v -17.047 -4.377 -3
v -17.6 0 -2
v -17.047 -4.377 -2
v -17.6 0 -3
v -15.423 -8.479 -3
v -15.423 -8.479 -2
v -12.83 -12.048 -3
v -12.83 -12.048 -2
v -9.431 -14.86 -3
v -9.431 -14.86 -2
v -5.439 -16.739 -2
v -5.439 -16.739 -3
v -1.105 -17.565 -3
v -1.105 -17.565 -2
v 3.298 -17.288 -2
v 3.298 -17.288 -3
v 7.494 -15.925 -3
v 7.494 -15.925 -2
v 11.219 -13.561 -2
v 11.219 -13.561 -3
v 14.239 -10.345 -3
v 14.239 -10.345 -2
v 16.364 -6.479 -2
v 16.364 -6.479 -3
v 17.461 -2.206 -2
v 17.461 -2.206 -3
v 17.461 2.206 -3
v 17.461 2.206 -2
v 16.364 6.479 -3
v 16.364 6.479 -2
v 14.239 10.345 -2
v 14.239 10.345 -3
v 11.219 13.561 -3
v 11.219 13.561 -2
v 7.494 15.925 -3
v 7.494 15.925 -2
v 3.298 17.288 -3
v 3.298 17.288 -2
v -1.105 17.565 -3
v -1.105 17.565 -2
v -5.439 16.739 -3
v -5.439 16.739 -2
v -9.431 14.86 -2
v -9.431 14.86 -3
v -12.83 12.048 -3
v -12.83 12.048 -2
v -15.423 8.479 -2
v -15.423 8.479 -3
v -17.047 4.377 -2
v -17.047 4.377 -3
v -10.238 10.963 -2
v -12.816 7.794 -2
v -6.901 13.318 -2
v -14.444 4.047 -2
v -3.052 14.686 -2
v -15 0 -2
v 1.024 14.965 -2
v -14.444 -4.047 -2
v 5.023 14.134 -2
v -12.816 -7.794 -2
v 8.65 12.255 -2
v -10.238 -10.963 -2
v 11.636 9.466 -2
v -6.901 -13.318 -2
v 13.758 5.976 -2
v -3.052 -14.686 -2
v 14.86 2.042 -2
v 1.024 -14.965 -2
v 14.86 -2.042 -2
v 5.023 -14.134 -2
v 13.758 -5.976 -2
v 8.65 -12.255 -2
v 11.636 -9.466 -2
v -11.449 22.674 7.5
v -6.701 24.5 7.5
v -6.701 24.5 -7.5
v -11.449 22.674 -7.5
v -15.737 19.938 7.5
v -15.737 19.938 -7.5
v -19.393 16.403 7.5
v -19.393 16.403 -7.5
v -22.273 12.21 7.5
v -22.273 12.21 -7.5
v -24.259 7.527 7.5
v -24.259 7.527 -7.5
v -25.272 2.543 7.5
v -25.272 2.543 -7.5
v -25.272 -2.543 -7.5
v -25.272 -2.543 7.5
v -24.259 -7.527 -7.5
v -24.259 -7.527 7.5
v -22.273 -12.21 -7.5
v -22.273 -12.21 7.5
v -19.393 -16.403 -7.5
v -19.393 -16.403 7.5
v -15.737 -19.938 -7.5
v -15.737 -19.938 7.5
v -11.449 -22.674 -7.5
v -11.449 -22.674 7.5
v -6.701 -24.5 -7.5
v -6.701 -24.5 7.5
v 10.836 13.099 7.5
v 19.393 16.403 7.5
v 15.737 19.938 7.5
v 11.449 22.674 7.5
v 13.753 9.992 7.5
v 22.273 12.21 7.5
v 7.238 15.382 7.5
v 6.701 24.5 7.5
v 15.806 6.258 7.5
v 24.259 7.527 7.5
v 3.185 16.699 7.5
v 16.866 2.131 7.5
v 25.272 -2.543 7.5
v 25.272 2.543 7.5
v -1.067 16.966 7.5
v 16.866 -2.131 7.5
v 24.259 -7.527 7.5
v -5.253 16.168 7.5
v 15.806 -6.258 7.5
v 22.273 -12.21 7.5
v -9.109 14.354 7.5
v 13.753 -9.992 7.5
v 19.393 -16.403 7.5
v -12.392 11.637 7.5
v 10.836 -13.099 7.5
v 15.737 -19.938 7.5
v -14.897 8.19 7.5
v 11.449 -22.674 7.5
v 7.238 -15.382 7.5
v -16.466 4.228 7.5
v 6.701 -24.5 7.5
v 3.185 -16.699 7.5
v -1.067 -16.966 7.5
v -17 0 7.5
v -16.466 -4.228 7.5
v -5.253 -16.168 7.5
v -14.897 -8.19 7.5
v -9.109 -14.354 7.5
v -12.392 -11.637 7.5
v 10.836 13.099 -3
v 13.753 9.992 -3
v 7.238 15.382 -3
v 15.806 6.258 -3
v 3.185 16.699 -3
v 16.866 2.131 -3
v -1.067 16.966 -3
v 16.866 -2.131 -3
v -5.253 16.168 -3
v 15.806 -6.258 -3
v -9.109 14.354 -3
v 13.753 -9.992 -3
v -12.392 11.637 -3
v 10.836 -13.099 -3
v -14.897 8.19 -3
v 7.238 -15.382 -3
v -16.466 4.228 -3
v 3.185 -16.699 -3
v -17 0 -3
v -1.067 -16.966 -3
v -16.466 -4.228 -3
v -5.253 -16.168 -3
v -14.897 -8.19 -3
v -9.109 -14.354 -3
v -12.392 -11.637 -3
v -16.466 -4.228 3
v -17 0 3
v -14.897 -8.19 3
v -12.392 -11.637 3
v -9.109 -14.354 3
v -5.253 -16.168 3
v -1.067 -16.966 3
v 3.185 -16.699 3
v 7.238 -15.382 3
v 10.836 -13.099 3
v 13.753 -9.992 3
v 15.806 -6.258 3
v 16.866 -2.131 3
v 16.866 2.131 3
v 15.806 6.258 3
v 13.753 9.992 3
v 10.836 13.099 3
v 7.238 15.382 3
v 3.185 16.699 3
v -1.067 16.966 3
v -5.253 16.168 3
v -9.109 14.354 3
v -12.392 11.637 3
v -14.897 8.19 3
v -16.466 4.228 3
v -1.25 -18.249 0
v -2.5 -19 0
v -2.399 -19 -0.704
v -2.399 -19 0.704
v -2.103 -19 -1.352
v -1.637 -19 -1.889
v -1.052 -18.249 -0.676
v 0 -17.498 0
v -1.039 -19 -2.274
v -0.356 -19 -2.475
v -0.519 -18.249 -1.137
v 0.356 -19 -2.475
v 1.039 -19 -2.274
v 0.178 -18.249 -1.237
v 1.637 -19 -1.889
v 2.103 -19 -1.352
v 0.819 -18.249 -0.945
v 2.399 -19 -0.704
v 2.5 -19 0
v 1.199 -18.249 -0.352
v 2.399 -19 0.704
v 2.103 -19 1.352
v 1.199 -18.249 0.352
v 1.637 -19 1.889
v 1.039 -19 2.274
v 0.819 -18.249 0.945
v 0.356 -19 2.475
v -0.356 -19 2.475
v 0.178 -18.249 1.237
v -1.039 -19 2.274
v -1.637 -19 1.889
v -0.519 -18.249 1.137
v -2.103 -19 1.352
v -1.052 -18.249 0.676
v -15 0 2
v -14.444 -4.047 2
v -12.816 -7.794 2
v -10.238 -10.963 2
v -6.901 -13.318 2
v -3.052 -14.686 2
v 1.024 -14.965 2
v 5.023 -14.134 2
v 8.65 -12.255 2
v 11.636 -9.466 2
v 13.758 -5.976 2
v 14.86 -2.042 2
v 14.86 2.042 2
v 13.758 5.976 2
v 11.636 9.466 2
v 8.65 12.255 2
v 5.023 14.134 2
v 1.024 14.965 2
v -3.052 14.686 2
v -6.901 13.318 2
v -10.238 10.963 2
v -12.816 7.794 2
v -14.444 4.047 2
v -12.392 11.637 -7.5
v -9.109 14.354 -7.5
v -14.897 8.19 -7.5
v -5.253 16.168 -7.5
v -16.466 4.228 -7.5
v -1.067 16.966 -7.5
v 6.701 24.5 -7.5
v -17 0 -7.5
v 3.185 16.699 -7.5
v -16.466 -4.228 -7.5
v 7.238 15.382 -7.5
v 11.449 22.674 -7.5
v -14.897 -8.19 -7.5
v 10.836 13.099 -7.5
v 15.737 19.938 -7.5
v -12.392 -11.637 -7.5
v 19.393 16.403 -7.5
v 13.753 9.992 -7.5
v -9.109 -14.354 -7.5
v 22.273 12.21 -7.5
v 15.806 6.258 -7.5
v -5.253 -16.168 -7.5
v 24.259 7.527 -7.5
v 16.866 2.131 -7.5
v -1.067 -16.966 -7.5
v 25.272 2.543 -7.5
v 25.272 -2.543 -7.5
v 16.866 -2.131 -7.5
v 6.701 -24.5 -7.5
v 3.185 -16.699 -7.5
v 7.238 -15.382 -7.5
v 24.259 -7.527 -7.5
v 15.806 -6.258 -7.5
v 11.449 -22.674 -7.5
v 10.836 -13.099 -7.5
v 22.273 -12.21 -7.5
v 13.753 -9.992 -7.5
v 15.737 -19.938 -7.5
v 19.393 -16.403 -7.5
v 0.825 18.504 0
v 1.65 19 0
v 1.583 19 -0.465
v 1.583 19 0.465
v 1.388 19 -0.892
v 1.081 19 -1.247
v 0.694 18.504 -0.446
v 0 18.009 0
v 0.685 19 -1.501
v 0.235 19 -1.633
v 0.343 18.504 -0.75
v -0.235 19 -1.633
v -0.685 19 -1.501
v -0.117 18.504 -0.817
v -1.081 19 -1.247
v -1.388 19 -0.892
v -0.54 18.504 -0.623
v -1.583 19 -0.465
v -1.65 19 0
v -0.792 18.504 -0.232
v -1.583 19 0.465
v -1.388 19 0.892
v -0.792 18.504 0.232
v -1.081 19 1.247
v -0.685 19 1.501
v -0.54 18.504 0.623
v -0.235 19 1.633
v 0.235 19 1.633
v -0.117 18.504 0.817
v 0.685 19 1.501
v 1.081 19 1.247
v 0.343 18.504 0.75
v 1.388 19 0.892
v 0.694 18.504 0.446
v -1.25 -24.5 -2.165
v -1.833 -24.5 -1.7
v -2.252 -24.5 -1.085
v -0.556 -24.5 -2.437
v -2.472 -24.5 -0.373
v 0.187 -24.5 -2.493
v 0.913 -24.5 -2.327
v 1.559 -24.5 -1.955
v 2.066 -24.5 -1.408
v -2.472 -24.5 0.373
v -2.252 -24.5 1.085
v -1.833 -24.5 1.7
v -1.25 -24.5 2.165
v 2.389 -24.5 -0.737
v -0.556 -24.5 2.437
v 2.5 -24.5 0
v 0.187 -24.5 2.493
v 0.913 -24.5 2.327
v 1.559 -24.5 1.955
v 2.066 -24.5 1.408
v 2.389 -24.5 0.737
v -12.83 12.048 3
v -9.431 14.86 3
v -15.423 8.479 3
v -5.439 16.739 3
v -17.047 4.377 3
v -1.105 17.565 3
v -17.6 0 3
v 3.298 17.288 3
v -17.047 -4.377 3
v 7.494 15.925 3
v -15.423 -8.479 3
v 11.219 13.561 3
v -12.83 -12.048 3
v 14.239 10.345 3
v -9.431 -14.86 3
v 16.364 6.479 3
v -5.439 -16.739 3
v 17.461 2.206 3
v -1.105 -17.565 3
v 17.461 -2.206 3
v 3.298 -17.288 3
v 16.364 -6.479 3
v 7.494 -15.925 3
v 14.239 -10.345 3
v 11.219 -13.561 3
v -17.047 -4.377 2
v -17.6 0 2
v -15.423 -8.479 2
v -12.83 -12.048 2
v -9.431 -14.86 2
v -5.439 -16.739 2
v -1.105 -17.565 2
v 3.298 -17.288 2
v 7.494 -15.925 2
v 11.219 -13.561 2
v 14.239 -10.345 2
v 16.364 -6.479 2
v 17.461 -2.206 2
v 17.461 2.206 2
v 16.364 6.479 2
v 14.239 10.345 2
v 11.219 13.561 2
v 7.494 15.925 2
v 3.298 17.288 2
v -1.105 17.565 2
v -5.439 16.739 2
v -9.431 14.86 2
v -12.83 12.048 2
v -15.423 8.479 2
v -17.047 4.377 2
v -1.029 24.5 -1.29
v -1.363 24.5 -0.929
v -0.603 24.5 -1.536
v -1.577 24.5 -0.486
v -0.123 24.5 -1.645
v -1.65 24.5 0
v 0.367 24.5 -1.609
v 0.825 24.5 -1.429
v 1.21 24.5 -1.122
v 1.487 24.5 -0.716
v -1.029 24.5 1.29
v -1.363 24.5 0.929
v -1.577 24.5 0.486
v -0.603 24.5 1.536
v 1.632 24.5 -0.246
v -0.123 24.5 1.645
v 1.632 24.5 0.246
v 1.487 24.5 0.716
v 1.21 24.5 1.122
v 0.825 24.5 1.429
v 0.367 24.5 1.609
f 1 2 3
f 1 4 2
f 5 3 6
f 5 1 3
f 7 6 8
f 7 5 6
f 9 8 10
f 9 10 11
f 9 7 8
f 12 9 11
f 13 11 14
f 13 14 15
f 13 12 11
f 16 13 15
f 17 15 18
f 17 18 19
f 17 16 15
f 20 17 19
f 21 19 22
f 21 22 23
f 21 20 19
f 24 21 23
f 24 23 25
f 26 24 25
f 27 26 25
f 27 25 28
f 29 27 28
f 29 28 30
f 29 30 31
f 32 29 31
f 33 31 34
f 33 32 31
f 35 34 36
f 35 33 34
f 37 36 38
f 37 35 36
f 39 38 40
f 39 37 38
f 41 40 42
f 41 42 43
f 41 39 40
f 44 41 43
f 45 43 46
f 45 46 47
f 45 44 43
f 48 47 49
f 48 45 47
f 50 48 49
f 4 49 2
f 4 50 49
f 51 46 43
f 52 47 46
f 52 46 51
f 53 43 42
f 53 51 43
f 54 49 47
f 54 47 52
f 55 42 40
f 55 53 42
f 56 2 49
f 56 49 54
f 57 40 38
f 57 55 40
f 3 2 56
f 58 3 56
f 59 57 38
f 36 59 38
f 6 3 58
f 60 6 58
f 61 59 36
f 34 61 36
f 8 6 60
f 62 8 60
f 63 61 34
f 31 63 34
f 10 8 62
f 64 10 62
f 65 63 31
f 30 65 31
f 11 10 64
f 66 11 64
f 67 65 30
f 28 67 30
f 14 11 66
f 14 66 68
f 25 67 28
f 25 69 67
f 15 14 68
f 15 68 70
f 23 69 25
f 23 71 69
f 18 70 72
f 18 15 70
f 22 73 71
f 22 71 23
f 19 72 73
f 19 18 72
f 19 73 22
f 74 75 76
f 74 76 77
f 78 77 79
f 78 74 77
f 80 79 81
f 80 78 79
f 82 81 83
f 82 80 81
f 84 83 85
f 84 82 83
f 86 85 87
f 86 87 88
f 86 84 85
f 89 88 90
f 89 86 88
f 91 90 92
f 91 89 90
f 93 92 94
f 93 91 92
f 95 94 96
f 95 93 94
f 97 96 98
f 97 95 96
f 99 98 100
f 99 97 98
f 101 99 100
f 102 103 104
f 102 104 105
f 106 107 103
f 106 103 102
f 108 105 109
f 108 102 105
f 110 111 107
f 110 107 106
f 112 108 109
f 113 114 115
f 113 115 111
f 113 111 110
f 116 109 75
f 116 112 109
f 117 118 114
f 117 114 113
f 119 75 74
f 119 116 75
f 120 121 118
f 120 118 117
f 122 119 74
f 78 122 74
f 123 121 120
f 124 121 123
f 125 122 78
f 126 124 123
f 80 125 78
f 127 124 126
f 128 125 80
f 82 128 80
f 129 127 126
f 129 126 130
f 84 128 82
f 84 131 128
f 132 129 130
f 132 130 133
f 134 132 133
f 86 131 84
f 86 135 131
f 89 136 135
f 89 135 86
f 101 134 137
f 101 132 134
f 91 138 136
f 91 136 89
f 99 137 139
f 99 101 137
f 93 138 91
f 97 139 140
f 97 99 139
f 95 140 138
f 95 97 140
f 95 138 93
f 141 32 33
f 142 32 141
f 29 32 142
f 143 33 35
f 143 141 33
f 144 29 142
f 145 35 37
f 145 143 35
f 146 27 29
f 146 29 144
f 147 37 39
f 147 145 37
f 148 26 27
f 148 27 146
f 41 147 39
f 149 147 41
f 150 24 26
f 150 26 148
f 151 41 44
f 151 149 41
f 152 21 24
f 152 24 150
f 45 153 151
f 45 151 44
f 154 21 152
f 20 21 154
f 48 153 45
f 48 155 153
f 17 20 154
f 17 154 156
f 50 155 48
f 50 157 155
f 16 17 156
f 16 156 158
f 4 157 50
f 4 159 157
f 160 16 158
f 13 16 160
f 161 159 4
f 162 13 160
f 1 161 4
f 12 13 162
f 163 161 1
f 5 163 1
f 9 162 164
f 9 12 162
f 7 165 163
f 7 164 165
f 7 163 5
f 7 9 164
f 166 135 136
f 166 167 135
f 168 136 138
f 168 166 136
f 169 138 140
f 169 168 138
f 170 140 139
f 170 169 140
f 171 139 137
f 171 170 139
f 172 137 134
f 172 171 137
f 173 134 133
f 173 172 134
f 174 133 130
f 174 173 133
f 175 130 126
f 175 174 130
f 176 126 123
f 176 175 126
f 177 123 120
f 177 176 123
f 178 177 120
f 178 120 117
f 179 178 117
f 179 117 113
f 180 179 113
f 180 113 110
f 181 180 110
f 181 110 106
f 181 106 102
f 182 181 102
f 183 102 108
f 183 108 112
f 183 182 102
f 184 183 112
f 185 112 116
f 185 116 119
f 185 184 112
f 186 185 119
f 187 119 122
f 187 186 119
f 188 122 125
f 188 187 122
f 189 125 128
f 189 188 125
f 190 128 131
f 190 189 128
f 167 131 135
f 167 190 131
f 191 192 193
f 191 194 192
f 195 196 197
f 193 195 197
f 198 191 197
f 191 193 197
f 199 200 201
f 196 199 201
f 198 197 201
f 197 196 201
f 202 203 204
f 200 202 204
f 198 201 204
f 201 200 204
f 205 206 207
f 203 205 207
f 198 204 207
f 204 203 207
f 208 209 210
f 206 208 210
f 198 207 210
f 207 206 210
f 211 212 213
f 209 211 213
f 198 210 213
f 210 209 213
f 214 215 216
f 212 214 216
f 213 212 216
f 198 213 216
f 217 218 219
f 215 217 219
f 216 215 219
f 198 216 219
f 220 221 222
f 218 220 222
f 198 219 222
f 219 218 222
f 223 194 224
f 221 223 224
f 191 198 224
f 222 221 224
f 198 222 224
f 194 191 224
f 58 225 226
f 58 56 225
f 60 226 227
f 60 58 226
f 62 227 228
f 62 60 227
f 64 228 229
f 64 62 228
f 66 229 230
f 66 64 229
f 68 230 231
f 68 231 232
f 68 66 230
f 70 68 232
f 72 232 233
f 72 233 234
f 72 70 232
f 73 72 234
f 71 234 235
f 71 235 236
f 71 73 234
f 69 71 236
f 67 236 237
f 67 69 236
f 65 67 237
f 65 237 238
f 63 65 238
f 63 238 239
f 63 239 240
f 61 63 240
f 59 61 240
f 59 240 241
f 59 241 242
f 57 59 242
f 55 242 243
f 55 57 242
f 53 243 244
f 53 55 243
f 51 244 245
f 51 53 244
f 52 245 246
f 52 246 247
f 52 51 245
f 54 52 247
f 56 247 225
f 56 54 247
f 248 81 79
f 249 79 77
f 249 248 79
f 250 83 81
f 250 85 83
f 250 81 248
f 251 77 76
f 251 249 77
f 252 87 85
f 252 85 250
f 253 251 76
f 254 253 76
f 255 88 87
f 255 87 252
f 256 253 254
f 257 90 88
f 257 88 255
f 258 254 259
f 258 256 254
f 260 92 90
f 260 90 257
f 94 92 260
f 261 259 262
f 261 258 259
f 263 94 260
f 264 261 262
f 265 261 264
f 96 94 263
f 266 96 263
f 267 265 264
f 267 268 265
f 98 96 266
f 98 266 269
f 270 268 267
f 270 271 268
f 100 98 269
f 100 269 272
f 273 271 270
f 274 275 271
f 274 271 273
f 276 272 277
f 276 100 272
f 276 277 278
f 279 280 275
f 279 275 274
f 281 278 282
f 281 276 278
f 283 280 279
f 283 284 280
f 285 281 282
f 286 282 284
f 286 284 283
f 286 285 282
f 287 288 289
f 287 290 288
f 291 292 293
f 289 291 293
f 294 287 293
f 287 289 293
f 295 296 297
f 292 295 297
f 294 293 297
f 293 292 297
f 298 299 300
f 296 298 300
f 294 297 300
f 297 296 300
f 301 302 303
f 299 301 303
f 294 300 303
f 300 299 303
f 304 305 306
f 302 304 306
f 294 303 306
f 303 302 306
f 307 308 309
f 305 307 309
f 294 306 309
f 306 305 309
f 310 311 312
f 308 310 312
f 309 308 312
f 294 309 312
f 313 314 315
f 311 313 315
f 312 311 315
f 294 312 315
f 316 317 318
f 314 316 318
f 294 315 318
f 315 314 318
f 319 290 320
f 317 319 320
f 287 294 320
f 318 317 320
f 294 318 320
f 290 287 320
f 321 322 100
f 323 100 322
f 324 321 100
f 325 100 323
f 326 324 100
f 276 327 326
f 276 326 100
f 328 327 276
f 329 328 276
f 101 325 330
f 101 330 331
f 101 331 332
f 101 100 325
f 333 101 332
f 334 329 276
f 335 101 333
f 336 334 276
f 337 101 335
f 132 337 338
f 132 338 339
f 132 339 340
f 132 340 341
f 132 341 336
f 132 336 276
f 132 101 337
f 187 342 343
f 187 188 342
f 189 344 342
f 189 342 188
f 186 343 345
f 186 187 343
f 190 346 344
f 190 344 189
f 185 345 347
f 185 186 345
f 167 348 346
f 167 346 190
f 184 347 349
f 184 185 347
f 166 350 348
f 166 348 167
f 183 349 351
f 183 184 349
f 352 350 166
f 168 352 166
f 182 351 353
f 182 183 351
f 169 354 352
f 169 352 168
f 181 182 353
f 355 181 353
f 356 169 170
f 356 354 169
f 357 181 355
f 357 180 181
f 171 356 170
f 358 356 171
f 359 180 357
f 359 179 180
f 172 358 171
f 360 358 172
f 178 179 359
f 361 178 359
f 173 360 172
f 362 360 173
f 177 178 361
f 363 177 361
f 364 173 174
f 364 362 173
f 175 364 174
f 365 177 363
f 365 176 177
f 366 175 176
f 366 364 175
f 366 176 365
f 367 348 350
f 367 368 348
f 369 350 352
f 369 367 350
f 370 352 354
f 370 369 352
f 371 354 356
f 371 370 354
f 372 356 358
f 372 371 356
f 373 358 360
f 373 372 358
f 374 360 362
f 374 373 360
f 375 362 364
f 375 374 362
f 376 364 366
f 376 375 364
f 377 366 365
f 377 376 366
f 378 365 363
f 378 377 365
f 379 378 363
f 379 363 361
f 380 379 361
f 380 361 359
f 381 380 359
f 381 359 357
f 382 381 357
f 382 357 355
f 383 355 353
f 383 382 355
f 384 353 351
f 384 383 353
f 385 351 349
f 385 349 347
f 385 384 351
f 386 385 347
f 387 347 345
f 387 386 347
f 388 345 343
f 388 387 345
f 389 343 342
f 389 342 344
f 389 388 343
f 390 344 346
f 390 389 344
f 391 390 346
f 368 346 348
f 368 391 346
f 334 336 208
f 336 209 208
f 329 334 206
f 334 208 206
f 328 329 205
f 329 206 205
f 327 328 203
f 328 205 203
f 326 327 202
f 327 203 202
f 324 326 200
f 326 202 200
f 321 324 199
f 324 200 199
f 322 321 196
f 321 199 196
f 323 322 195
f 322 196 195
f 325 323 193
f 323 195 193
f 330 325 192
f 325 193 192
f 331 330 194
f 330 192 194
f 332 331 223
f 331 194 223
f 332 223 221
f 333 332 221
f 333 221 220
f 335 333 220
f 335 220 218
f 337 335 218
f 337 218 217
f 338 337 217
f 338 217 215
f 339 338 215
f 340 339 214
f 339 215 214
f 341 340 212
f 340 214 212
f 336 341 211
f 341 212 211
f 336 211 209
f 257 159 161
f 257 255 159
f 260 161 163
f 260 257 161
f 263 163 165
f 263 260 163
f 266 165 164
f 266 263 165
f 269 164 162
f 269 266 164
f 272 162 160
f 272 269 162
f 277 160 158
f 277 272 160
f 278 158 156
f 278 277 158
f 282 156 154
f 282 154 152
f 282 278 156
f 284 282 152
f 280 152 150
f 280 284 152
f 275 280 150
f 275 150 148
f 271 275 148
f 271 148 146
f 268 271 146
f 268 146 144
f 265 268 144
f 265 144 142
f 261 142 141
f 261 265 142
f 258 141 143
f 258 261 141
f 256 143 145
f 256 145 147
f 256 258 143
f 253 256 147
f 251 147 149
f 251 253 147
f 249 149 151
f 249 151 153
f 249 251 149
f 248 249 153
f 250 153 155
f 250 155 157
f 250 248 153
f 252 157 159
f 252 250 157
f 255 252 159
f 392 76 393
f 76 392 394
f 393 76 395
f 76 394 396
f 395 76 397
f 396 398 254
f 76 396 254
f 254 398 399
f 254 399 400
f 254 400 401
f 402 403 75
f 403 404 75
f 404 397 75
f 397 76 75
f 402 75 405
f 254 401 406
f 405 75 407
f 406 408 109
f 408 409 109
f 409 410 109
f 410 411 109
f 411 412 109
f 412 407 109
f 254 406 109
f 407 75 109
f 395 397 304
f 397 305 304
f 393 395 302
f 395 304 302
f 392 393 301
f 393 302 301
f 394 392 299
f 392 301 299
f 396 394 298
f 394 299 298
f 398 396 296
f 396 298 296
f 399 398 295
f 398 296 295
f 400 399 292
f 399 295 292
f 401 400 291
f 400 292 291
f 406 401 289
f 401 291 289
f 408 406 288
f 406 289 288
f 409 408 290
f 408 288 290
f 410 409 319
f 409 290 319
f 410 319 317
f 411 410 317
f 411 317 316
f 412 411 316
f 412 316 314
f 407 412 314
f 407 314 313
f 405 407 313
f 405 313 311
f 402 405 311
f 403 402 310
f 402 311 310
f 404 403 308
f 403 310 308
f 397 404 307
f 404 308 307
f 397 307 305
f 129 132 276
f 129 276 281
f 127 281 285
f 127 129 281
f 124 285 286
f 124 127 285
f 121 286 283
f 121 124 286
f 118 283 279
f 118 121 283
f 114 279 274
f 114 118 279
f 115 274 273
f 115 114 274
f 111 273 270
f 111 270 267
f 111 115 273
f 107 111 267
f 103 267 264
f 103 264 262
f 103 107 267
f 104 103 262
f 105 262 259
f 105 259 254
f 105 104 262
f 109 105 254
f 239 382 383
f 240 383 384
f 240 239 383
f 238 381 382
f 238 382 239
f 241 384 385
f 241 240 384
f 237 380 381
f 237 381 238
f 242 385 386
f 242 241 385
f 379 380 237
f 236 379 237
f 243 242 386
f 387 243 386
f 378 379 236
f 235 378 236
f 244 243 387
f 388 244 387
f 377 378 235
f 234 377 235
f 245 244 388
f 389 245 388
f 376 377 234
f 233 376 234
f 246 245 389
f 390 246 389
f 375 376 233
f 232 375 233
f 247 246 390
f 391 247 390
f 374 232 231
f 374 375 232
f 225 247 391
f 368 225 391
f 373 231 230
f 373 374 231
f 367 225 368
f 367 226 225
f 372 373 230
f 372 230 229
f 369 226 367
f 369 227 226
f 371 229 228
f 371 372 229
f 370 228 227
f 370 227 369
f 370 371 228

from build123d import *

# Parameters (mm, degrees)
SKETCH_2_W             = 64.02174429
SKETCH_2_H             = 9.248919907
CUT_EXTRUDE_1_DEPTH    = 49
HOLE_WIZARD_M4_2_D     = 3.3
HOLE_WIZARD_M4_2_DEPTH = 5.5
HOLE_WIZARD_M4_2_TIP   = 0.991420021
HOLE_WIZARD_M6_2_D     = 5
HOLE_WIZARD_M6_2_DEPTH = 5.5
HOLE_WIZARD_M6_2_TIP   = 1.502151548


with BuildPart() as part:
    # 草图1 → 旋转1 (revolve)
    with BuildSketch(Plane(origin=(0, 0, 0), x_dir=(1, 0, 0), z_dir=(0, 1, 0)), mode=Mode.PRIVATE) as revolve_1_sk:
        Polygon((25.4, 7.5), (25.4, -7.5), (17, -7.5), (17, -3), (17.6, -3), (17.6, -2), (15, -2), (15, 2), (17.6, 2), (17.6, 3), (17, 3), (17, 7.5), align=None)
    revolve(revolve_1_sk.sketch.rotate(Axis((0, 0, -31.9390681), (0, 0, 1)), 180), axis=Axis((0, 0, -31.9390681), (0, 0, 1)))  # turned: the seam where the file's is

    # 草图2 → 切除-拉伸1 (cut)
    with BuildSketch(Plane.XY.offset(7.5)):
        with Locations((-1.141100508, 29.124459954)):
            Rectangle(SKETCH_2_W, SKETCH_2_H)
        with Locations((-1.141100508, -29.124459954)):
            Rectangle(SKETCH_2_W, SKETCH_2_H)
    extrude(amount=-CUT_EXTRUDE_1_DEPTH, mode=Mode.SUBTRACT)

    # M4 螺纹孔2
    with Locations(Plane(origin=(0, 24.5, 0), x_dir=(1, 0, 0), z_dir=(0, 1, 0))):
        with Locations((0, 0)):
            Hole(HOLE_WIZARD_M4_2_D / 2, depth=HOLE_WIZARD_M4_2_DEPTH)
            with Locations((0, 0, -(HOLE_WIZARD_M4_2_DEPTH + HOLE_WIZARD_M4_2_TIP / 2))):  # 118° drill point
                Cone(0, HOLE_WIZARD_M4_2_D / 2, HOLE_WIZARD_M4_2_TIP, mode=Mode.SUBTRACT)

    # M6 螺纹孔2
    with Locations(Plane(origin=(0, -24.5, 0), x_dir=(-1, 0, 0), z_dir=(0, -1, 0))):
        with Locations((0, 0)):
            Hole(HOLE_WIZARD_M6_2_D / 2, depth=HOLE_WIZARD_M6_2_DEPTH)
            with Locations((0, 0, -(HOLE_WIZARD_M6_2_DEPTH + HOLE_WIZARD_M6_2_TIP / 2))):  # 118° drill point
                Cone(0, HOLE_WIZARD_M6_2_D / 2, HOLE_WIZARD_M6_2_TIP, mode=Mode.SUBTRACT)


solid = part.part
